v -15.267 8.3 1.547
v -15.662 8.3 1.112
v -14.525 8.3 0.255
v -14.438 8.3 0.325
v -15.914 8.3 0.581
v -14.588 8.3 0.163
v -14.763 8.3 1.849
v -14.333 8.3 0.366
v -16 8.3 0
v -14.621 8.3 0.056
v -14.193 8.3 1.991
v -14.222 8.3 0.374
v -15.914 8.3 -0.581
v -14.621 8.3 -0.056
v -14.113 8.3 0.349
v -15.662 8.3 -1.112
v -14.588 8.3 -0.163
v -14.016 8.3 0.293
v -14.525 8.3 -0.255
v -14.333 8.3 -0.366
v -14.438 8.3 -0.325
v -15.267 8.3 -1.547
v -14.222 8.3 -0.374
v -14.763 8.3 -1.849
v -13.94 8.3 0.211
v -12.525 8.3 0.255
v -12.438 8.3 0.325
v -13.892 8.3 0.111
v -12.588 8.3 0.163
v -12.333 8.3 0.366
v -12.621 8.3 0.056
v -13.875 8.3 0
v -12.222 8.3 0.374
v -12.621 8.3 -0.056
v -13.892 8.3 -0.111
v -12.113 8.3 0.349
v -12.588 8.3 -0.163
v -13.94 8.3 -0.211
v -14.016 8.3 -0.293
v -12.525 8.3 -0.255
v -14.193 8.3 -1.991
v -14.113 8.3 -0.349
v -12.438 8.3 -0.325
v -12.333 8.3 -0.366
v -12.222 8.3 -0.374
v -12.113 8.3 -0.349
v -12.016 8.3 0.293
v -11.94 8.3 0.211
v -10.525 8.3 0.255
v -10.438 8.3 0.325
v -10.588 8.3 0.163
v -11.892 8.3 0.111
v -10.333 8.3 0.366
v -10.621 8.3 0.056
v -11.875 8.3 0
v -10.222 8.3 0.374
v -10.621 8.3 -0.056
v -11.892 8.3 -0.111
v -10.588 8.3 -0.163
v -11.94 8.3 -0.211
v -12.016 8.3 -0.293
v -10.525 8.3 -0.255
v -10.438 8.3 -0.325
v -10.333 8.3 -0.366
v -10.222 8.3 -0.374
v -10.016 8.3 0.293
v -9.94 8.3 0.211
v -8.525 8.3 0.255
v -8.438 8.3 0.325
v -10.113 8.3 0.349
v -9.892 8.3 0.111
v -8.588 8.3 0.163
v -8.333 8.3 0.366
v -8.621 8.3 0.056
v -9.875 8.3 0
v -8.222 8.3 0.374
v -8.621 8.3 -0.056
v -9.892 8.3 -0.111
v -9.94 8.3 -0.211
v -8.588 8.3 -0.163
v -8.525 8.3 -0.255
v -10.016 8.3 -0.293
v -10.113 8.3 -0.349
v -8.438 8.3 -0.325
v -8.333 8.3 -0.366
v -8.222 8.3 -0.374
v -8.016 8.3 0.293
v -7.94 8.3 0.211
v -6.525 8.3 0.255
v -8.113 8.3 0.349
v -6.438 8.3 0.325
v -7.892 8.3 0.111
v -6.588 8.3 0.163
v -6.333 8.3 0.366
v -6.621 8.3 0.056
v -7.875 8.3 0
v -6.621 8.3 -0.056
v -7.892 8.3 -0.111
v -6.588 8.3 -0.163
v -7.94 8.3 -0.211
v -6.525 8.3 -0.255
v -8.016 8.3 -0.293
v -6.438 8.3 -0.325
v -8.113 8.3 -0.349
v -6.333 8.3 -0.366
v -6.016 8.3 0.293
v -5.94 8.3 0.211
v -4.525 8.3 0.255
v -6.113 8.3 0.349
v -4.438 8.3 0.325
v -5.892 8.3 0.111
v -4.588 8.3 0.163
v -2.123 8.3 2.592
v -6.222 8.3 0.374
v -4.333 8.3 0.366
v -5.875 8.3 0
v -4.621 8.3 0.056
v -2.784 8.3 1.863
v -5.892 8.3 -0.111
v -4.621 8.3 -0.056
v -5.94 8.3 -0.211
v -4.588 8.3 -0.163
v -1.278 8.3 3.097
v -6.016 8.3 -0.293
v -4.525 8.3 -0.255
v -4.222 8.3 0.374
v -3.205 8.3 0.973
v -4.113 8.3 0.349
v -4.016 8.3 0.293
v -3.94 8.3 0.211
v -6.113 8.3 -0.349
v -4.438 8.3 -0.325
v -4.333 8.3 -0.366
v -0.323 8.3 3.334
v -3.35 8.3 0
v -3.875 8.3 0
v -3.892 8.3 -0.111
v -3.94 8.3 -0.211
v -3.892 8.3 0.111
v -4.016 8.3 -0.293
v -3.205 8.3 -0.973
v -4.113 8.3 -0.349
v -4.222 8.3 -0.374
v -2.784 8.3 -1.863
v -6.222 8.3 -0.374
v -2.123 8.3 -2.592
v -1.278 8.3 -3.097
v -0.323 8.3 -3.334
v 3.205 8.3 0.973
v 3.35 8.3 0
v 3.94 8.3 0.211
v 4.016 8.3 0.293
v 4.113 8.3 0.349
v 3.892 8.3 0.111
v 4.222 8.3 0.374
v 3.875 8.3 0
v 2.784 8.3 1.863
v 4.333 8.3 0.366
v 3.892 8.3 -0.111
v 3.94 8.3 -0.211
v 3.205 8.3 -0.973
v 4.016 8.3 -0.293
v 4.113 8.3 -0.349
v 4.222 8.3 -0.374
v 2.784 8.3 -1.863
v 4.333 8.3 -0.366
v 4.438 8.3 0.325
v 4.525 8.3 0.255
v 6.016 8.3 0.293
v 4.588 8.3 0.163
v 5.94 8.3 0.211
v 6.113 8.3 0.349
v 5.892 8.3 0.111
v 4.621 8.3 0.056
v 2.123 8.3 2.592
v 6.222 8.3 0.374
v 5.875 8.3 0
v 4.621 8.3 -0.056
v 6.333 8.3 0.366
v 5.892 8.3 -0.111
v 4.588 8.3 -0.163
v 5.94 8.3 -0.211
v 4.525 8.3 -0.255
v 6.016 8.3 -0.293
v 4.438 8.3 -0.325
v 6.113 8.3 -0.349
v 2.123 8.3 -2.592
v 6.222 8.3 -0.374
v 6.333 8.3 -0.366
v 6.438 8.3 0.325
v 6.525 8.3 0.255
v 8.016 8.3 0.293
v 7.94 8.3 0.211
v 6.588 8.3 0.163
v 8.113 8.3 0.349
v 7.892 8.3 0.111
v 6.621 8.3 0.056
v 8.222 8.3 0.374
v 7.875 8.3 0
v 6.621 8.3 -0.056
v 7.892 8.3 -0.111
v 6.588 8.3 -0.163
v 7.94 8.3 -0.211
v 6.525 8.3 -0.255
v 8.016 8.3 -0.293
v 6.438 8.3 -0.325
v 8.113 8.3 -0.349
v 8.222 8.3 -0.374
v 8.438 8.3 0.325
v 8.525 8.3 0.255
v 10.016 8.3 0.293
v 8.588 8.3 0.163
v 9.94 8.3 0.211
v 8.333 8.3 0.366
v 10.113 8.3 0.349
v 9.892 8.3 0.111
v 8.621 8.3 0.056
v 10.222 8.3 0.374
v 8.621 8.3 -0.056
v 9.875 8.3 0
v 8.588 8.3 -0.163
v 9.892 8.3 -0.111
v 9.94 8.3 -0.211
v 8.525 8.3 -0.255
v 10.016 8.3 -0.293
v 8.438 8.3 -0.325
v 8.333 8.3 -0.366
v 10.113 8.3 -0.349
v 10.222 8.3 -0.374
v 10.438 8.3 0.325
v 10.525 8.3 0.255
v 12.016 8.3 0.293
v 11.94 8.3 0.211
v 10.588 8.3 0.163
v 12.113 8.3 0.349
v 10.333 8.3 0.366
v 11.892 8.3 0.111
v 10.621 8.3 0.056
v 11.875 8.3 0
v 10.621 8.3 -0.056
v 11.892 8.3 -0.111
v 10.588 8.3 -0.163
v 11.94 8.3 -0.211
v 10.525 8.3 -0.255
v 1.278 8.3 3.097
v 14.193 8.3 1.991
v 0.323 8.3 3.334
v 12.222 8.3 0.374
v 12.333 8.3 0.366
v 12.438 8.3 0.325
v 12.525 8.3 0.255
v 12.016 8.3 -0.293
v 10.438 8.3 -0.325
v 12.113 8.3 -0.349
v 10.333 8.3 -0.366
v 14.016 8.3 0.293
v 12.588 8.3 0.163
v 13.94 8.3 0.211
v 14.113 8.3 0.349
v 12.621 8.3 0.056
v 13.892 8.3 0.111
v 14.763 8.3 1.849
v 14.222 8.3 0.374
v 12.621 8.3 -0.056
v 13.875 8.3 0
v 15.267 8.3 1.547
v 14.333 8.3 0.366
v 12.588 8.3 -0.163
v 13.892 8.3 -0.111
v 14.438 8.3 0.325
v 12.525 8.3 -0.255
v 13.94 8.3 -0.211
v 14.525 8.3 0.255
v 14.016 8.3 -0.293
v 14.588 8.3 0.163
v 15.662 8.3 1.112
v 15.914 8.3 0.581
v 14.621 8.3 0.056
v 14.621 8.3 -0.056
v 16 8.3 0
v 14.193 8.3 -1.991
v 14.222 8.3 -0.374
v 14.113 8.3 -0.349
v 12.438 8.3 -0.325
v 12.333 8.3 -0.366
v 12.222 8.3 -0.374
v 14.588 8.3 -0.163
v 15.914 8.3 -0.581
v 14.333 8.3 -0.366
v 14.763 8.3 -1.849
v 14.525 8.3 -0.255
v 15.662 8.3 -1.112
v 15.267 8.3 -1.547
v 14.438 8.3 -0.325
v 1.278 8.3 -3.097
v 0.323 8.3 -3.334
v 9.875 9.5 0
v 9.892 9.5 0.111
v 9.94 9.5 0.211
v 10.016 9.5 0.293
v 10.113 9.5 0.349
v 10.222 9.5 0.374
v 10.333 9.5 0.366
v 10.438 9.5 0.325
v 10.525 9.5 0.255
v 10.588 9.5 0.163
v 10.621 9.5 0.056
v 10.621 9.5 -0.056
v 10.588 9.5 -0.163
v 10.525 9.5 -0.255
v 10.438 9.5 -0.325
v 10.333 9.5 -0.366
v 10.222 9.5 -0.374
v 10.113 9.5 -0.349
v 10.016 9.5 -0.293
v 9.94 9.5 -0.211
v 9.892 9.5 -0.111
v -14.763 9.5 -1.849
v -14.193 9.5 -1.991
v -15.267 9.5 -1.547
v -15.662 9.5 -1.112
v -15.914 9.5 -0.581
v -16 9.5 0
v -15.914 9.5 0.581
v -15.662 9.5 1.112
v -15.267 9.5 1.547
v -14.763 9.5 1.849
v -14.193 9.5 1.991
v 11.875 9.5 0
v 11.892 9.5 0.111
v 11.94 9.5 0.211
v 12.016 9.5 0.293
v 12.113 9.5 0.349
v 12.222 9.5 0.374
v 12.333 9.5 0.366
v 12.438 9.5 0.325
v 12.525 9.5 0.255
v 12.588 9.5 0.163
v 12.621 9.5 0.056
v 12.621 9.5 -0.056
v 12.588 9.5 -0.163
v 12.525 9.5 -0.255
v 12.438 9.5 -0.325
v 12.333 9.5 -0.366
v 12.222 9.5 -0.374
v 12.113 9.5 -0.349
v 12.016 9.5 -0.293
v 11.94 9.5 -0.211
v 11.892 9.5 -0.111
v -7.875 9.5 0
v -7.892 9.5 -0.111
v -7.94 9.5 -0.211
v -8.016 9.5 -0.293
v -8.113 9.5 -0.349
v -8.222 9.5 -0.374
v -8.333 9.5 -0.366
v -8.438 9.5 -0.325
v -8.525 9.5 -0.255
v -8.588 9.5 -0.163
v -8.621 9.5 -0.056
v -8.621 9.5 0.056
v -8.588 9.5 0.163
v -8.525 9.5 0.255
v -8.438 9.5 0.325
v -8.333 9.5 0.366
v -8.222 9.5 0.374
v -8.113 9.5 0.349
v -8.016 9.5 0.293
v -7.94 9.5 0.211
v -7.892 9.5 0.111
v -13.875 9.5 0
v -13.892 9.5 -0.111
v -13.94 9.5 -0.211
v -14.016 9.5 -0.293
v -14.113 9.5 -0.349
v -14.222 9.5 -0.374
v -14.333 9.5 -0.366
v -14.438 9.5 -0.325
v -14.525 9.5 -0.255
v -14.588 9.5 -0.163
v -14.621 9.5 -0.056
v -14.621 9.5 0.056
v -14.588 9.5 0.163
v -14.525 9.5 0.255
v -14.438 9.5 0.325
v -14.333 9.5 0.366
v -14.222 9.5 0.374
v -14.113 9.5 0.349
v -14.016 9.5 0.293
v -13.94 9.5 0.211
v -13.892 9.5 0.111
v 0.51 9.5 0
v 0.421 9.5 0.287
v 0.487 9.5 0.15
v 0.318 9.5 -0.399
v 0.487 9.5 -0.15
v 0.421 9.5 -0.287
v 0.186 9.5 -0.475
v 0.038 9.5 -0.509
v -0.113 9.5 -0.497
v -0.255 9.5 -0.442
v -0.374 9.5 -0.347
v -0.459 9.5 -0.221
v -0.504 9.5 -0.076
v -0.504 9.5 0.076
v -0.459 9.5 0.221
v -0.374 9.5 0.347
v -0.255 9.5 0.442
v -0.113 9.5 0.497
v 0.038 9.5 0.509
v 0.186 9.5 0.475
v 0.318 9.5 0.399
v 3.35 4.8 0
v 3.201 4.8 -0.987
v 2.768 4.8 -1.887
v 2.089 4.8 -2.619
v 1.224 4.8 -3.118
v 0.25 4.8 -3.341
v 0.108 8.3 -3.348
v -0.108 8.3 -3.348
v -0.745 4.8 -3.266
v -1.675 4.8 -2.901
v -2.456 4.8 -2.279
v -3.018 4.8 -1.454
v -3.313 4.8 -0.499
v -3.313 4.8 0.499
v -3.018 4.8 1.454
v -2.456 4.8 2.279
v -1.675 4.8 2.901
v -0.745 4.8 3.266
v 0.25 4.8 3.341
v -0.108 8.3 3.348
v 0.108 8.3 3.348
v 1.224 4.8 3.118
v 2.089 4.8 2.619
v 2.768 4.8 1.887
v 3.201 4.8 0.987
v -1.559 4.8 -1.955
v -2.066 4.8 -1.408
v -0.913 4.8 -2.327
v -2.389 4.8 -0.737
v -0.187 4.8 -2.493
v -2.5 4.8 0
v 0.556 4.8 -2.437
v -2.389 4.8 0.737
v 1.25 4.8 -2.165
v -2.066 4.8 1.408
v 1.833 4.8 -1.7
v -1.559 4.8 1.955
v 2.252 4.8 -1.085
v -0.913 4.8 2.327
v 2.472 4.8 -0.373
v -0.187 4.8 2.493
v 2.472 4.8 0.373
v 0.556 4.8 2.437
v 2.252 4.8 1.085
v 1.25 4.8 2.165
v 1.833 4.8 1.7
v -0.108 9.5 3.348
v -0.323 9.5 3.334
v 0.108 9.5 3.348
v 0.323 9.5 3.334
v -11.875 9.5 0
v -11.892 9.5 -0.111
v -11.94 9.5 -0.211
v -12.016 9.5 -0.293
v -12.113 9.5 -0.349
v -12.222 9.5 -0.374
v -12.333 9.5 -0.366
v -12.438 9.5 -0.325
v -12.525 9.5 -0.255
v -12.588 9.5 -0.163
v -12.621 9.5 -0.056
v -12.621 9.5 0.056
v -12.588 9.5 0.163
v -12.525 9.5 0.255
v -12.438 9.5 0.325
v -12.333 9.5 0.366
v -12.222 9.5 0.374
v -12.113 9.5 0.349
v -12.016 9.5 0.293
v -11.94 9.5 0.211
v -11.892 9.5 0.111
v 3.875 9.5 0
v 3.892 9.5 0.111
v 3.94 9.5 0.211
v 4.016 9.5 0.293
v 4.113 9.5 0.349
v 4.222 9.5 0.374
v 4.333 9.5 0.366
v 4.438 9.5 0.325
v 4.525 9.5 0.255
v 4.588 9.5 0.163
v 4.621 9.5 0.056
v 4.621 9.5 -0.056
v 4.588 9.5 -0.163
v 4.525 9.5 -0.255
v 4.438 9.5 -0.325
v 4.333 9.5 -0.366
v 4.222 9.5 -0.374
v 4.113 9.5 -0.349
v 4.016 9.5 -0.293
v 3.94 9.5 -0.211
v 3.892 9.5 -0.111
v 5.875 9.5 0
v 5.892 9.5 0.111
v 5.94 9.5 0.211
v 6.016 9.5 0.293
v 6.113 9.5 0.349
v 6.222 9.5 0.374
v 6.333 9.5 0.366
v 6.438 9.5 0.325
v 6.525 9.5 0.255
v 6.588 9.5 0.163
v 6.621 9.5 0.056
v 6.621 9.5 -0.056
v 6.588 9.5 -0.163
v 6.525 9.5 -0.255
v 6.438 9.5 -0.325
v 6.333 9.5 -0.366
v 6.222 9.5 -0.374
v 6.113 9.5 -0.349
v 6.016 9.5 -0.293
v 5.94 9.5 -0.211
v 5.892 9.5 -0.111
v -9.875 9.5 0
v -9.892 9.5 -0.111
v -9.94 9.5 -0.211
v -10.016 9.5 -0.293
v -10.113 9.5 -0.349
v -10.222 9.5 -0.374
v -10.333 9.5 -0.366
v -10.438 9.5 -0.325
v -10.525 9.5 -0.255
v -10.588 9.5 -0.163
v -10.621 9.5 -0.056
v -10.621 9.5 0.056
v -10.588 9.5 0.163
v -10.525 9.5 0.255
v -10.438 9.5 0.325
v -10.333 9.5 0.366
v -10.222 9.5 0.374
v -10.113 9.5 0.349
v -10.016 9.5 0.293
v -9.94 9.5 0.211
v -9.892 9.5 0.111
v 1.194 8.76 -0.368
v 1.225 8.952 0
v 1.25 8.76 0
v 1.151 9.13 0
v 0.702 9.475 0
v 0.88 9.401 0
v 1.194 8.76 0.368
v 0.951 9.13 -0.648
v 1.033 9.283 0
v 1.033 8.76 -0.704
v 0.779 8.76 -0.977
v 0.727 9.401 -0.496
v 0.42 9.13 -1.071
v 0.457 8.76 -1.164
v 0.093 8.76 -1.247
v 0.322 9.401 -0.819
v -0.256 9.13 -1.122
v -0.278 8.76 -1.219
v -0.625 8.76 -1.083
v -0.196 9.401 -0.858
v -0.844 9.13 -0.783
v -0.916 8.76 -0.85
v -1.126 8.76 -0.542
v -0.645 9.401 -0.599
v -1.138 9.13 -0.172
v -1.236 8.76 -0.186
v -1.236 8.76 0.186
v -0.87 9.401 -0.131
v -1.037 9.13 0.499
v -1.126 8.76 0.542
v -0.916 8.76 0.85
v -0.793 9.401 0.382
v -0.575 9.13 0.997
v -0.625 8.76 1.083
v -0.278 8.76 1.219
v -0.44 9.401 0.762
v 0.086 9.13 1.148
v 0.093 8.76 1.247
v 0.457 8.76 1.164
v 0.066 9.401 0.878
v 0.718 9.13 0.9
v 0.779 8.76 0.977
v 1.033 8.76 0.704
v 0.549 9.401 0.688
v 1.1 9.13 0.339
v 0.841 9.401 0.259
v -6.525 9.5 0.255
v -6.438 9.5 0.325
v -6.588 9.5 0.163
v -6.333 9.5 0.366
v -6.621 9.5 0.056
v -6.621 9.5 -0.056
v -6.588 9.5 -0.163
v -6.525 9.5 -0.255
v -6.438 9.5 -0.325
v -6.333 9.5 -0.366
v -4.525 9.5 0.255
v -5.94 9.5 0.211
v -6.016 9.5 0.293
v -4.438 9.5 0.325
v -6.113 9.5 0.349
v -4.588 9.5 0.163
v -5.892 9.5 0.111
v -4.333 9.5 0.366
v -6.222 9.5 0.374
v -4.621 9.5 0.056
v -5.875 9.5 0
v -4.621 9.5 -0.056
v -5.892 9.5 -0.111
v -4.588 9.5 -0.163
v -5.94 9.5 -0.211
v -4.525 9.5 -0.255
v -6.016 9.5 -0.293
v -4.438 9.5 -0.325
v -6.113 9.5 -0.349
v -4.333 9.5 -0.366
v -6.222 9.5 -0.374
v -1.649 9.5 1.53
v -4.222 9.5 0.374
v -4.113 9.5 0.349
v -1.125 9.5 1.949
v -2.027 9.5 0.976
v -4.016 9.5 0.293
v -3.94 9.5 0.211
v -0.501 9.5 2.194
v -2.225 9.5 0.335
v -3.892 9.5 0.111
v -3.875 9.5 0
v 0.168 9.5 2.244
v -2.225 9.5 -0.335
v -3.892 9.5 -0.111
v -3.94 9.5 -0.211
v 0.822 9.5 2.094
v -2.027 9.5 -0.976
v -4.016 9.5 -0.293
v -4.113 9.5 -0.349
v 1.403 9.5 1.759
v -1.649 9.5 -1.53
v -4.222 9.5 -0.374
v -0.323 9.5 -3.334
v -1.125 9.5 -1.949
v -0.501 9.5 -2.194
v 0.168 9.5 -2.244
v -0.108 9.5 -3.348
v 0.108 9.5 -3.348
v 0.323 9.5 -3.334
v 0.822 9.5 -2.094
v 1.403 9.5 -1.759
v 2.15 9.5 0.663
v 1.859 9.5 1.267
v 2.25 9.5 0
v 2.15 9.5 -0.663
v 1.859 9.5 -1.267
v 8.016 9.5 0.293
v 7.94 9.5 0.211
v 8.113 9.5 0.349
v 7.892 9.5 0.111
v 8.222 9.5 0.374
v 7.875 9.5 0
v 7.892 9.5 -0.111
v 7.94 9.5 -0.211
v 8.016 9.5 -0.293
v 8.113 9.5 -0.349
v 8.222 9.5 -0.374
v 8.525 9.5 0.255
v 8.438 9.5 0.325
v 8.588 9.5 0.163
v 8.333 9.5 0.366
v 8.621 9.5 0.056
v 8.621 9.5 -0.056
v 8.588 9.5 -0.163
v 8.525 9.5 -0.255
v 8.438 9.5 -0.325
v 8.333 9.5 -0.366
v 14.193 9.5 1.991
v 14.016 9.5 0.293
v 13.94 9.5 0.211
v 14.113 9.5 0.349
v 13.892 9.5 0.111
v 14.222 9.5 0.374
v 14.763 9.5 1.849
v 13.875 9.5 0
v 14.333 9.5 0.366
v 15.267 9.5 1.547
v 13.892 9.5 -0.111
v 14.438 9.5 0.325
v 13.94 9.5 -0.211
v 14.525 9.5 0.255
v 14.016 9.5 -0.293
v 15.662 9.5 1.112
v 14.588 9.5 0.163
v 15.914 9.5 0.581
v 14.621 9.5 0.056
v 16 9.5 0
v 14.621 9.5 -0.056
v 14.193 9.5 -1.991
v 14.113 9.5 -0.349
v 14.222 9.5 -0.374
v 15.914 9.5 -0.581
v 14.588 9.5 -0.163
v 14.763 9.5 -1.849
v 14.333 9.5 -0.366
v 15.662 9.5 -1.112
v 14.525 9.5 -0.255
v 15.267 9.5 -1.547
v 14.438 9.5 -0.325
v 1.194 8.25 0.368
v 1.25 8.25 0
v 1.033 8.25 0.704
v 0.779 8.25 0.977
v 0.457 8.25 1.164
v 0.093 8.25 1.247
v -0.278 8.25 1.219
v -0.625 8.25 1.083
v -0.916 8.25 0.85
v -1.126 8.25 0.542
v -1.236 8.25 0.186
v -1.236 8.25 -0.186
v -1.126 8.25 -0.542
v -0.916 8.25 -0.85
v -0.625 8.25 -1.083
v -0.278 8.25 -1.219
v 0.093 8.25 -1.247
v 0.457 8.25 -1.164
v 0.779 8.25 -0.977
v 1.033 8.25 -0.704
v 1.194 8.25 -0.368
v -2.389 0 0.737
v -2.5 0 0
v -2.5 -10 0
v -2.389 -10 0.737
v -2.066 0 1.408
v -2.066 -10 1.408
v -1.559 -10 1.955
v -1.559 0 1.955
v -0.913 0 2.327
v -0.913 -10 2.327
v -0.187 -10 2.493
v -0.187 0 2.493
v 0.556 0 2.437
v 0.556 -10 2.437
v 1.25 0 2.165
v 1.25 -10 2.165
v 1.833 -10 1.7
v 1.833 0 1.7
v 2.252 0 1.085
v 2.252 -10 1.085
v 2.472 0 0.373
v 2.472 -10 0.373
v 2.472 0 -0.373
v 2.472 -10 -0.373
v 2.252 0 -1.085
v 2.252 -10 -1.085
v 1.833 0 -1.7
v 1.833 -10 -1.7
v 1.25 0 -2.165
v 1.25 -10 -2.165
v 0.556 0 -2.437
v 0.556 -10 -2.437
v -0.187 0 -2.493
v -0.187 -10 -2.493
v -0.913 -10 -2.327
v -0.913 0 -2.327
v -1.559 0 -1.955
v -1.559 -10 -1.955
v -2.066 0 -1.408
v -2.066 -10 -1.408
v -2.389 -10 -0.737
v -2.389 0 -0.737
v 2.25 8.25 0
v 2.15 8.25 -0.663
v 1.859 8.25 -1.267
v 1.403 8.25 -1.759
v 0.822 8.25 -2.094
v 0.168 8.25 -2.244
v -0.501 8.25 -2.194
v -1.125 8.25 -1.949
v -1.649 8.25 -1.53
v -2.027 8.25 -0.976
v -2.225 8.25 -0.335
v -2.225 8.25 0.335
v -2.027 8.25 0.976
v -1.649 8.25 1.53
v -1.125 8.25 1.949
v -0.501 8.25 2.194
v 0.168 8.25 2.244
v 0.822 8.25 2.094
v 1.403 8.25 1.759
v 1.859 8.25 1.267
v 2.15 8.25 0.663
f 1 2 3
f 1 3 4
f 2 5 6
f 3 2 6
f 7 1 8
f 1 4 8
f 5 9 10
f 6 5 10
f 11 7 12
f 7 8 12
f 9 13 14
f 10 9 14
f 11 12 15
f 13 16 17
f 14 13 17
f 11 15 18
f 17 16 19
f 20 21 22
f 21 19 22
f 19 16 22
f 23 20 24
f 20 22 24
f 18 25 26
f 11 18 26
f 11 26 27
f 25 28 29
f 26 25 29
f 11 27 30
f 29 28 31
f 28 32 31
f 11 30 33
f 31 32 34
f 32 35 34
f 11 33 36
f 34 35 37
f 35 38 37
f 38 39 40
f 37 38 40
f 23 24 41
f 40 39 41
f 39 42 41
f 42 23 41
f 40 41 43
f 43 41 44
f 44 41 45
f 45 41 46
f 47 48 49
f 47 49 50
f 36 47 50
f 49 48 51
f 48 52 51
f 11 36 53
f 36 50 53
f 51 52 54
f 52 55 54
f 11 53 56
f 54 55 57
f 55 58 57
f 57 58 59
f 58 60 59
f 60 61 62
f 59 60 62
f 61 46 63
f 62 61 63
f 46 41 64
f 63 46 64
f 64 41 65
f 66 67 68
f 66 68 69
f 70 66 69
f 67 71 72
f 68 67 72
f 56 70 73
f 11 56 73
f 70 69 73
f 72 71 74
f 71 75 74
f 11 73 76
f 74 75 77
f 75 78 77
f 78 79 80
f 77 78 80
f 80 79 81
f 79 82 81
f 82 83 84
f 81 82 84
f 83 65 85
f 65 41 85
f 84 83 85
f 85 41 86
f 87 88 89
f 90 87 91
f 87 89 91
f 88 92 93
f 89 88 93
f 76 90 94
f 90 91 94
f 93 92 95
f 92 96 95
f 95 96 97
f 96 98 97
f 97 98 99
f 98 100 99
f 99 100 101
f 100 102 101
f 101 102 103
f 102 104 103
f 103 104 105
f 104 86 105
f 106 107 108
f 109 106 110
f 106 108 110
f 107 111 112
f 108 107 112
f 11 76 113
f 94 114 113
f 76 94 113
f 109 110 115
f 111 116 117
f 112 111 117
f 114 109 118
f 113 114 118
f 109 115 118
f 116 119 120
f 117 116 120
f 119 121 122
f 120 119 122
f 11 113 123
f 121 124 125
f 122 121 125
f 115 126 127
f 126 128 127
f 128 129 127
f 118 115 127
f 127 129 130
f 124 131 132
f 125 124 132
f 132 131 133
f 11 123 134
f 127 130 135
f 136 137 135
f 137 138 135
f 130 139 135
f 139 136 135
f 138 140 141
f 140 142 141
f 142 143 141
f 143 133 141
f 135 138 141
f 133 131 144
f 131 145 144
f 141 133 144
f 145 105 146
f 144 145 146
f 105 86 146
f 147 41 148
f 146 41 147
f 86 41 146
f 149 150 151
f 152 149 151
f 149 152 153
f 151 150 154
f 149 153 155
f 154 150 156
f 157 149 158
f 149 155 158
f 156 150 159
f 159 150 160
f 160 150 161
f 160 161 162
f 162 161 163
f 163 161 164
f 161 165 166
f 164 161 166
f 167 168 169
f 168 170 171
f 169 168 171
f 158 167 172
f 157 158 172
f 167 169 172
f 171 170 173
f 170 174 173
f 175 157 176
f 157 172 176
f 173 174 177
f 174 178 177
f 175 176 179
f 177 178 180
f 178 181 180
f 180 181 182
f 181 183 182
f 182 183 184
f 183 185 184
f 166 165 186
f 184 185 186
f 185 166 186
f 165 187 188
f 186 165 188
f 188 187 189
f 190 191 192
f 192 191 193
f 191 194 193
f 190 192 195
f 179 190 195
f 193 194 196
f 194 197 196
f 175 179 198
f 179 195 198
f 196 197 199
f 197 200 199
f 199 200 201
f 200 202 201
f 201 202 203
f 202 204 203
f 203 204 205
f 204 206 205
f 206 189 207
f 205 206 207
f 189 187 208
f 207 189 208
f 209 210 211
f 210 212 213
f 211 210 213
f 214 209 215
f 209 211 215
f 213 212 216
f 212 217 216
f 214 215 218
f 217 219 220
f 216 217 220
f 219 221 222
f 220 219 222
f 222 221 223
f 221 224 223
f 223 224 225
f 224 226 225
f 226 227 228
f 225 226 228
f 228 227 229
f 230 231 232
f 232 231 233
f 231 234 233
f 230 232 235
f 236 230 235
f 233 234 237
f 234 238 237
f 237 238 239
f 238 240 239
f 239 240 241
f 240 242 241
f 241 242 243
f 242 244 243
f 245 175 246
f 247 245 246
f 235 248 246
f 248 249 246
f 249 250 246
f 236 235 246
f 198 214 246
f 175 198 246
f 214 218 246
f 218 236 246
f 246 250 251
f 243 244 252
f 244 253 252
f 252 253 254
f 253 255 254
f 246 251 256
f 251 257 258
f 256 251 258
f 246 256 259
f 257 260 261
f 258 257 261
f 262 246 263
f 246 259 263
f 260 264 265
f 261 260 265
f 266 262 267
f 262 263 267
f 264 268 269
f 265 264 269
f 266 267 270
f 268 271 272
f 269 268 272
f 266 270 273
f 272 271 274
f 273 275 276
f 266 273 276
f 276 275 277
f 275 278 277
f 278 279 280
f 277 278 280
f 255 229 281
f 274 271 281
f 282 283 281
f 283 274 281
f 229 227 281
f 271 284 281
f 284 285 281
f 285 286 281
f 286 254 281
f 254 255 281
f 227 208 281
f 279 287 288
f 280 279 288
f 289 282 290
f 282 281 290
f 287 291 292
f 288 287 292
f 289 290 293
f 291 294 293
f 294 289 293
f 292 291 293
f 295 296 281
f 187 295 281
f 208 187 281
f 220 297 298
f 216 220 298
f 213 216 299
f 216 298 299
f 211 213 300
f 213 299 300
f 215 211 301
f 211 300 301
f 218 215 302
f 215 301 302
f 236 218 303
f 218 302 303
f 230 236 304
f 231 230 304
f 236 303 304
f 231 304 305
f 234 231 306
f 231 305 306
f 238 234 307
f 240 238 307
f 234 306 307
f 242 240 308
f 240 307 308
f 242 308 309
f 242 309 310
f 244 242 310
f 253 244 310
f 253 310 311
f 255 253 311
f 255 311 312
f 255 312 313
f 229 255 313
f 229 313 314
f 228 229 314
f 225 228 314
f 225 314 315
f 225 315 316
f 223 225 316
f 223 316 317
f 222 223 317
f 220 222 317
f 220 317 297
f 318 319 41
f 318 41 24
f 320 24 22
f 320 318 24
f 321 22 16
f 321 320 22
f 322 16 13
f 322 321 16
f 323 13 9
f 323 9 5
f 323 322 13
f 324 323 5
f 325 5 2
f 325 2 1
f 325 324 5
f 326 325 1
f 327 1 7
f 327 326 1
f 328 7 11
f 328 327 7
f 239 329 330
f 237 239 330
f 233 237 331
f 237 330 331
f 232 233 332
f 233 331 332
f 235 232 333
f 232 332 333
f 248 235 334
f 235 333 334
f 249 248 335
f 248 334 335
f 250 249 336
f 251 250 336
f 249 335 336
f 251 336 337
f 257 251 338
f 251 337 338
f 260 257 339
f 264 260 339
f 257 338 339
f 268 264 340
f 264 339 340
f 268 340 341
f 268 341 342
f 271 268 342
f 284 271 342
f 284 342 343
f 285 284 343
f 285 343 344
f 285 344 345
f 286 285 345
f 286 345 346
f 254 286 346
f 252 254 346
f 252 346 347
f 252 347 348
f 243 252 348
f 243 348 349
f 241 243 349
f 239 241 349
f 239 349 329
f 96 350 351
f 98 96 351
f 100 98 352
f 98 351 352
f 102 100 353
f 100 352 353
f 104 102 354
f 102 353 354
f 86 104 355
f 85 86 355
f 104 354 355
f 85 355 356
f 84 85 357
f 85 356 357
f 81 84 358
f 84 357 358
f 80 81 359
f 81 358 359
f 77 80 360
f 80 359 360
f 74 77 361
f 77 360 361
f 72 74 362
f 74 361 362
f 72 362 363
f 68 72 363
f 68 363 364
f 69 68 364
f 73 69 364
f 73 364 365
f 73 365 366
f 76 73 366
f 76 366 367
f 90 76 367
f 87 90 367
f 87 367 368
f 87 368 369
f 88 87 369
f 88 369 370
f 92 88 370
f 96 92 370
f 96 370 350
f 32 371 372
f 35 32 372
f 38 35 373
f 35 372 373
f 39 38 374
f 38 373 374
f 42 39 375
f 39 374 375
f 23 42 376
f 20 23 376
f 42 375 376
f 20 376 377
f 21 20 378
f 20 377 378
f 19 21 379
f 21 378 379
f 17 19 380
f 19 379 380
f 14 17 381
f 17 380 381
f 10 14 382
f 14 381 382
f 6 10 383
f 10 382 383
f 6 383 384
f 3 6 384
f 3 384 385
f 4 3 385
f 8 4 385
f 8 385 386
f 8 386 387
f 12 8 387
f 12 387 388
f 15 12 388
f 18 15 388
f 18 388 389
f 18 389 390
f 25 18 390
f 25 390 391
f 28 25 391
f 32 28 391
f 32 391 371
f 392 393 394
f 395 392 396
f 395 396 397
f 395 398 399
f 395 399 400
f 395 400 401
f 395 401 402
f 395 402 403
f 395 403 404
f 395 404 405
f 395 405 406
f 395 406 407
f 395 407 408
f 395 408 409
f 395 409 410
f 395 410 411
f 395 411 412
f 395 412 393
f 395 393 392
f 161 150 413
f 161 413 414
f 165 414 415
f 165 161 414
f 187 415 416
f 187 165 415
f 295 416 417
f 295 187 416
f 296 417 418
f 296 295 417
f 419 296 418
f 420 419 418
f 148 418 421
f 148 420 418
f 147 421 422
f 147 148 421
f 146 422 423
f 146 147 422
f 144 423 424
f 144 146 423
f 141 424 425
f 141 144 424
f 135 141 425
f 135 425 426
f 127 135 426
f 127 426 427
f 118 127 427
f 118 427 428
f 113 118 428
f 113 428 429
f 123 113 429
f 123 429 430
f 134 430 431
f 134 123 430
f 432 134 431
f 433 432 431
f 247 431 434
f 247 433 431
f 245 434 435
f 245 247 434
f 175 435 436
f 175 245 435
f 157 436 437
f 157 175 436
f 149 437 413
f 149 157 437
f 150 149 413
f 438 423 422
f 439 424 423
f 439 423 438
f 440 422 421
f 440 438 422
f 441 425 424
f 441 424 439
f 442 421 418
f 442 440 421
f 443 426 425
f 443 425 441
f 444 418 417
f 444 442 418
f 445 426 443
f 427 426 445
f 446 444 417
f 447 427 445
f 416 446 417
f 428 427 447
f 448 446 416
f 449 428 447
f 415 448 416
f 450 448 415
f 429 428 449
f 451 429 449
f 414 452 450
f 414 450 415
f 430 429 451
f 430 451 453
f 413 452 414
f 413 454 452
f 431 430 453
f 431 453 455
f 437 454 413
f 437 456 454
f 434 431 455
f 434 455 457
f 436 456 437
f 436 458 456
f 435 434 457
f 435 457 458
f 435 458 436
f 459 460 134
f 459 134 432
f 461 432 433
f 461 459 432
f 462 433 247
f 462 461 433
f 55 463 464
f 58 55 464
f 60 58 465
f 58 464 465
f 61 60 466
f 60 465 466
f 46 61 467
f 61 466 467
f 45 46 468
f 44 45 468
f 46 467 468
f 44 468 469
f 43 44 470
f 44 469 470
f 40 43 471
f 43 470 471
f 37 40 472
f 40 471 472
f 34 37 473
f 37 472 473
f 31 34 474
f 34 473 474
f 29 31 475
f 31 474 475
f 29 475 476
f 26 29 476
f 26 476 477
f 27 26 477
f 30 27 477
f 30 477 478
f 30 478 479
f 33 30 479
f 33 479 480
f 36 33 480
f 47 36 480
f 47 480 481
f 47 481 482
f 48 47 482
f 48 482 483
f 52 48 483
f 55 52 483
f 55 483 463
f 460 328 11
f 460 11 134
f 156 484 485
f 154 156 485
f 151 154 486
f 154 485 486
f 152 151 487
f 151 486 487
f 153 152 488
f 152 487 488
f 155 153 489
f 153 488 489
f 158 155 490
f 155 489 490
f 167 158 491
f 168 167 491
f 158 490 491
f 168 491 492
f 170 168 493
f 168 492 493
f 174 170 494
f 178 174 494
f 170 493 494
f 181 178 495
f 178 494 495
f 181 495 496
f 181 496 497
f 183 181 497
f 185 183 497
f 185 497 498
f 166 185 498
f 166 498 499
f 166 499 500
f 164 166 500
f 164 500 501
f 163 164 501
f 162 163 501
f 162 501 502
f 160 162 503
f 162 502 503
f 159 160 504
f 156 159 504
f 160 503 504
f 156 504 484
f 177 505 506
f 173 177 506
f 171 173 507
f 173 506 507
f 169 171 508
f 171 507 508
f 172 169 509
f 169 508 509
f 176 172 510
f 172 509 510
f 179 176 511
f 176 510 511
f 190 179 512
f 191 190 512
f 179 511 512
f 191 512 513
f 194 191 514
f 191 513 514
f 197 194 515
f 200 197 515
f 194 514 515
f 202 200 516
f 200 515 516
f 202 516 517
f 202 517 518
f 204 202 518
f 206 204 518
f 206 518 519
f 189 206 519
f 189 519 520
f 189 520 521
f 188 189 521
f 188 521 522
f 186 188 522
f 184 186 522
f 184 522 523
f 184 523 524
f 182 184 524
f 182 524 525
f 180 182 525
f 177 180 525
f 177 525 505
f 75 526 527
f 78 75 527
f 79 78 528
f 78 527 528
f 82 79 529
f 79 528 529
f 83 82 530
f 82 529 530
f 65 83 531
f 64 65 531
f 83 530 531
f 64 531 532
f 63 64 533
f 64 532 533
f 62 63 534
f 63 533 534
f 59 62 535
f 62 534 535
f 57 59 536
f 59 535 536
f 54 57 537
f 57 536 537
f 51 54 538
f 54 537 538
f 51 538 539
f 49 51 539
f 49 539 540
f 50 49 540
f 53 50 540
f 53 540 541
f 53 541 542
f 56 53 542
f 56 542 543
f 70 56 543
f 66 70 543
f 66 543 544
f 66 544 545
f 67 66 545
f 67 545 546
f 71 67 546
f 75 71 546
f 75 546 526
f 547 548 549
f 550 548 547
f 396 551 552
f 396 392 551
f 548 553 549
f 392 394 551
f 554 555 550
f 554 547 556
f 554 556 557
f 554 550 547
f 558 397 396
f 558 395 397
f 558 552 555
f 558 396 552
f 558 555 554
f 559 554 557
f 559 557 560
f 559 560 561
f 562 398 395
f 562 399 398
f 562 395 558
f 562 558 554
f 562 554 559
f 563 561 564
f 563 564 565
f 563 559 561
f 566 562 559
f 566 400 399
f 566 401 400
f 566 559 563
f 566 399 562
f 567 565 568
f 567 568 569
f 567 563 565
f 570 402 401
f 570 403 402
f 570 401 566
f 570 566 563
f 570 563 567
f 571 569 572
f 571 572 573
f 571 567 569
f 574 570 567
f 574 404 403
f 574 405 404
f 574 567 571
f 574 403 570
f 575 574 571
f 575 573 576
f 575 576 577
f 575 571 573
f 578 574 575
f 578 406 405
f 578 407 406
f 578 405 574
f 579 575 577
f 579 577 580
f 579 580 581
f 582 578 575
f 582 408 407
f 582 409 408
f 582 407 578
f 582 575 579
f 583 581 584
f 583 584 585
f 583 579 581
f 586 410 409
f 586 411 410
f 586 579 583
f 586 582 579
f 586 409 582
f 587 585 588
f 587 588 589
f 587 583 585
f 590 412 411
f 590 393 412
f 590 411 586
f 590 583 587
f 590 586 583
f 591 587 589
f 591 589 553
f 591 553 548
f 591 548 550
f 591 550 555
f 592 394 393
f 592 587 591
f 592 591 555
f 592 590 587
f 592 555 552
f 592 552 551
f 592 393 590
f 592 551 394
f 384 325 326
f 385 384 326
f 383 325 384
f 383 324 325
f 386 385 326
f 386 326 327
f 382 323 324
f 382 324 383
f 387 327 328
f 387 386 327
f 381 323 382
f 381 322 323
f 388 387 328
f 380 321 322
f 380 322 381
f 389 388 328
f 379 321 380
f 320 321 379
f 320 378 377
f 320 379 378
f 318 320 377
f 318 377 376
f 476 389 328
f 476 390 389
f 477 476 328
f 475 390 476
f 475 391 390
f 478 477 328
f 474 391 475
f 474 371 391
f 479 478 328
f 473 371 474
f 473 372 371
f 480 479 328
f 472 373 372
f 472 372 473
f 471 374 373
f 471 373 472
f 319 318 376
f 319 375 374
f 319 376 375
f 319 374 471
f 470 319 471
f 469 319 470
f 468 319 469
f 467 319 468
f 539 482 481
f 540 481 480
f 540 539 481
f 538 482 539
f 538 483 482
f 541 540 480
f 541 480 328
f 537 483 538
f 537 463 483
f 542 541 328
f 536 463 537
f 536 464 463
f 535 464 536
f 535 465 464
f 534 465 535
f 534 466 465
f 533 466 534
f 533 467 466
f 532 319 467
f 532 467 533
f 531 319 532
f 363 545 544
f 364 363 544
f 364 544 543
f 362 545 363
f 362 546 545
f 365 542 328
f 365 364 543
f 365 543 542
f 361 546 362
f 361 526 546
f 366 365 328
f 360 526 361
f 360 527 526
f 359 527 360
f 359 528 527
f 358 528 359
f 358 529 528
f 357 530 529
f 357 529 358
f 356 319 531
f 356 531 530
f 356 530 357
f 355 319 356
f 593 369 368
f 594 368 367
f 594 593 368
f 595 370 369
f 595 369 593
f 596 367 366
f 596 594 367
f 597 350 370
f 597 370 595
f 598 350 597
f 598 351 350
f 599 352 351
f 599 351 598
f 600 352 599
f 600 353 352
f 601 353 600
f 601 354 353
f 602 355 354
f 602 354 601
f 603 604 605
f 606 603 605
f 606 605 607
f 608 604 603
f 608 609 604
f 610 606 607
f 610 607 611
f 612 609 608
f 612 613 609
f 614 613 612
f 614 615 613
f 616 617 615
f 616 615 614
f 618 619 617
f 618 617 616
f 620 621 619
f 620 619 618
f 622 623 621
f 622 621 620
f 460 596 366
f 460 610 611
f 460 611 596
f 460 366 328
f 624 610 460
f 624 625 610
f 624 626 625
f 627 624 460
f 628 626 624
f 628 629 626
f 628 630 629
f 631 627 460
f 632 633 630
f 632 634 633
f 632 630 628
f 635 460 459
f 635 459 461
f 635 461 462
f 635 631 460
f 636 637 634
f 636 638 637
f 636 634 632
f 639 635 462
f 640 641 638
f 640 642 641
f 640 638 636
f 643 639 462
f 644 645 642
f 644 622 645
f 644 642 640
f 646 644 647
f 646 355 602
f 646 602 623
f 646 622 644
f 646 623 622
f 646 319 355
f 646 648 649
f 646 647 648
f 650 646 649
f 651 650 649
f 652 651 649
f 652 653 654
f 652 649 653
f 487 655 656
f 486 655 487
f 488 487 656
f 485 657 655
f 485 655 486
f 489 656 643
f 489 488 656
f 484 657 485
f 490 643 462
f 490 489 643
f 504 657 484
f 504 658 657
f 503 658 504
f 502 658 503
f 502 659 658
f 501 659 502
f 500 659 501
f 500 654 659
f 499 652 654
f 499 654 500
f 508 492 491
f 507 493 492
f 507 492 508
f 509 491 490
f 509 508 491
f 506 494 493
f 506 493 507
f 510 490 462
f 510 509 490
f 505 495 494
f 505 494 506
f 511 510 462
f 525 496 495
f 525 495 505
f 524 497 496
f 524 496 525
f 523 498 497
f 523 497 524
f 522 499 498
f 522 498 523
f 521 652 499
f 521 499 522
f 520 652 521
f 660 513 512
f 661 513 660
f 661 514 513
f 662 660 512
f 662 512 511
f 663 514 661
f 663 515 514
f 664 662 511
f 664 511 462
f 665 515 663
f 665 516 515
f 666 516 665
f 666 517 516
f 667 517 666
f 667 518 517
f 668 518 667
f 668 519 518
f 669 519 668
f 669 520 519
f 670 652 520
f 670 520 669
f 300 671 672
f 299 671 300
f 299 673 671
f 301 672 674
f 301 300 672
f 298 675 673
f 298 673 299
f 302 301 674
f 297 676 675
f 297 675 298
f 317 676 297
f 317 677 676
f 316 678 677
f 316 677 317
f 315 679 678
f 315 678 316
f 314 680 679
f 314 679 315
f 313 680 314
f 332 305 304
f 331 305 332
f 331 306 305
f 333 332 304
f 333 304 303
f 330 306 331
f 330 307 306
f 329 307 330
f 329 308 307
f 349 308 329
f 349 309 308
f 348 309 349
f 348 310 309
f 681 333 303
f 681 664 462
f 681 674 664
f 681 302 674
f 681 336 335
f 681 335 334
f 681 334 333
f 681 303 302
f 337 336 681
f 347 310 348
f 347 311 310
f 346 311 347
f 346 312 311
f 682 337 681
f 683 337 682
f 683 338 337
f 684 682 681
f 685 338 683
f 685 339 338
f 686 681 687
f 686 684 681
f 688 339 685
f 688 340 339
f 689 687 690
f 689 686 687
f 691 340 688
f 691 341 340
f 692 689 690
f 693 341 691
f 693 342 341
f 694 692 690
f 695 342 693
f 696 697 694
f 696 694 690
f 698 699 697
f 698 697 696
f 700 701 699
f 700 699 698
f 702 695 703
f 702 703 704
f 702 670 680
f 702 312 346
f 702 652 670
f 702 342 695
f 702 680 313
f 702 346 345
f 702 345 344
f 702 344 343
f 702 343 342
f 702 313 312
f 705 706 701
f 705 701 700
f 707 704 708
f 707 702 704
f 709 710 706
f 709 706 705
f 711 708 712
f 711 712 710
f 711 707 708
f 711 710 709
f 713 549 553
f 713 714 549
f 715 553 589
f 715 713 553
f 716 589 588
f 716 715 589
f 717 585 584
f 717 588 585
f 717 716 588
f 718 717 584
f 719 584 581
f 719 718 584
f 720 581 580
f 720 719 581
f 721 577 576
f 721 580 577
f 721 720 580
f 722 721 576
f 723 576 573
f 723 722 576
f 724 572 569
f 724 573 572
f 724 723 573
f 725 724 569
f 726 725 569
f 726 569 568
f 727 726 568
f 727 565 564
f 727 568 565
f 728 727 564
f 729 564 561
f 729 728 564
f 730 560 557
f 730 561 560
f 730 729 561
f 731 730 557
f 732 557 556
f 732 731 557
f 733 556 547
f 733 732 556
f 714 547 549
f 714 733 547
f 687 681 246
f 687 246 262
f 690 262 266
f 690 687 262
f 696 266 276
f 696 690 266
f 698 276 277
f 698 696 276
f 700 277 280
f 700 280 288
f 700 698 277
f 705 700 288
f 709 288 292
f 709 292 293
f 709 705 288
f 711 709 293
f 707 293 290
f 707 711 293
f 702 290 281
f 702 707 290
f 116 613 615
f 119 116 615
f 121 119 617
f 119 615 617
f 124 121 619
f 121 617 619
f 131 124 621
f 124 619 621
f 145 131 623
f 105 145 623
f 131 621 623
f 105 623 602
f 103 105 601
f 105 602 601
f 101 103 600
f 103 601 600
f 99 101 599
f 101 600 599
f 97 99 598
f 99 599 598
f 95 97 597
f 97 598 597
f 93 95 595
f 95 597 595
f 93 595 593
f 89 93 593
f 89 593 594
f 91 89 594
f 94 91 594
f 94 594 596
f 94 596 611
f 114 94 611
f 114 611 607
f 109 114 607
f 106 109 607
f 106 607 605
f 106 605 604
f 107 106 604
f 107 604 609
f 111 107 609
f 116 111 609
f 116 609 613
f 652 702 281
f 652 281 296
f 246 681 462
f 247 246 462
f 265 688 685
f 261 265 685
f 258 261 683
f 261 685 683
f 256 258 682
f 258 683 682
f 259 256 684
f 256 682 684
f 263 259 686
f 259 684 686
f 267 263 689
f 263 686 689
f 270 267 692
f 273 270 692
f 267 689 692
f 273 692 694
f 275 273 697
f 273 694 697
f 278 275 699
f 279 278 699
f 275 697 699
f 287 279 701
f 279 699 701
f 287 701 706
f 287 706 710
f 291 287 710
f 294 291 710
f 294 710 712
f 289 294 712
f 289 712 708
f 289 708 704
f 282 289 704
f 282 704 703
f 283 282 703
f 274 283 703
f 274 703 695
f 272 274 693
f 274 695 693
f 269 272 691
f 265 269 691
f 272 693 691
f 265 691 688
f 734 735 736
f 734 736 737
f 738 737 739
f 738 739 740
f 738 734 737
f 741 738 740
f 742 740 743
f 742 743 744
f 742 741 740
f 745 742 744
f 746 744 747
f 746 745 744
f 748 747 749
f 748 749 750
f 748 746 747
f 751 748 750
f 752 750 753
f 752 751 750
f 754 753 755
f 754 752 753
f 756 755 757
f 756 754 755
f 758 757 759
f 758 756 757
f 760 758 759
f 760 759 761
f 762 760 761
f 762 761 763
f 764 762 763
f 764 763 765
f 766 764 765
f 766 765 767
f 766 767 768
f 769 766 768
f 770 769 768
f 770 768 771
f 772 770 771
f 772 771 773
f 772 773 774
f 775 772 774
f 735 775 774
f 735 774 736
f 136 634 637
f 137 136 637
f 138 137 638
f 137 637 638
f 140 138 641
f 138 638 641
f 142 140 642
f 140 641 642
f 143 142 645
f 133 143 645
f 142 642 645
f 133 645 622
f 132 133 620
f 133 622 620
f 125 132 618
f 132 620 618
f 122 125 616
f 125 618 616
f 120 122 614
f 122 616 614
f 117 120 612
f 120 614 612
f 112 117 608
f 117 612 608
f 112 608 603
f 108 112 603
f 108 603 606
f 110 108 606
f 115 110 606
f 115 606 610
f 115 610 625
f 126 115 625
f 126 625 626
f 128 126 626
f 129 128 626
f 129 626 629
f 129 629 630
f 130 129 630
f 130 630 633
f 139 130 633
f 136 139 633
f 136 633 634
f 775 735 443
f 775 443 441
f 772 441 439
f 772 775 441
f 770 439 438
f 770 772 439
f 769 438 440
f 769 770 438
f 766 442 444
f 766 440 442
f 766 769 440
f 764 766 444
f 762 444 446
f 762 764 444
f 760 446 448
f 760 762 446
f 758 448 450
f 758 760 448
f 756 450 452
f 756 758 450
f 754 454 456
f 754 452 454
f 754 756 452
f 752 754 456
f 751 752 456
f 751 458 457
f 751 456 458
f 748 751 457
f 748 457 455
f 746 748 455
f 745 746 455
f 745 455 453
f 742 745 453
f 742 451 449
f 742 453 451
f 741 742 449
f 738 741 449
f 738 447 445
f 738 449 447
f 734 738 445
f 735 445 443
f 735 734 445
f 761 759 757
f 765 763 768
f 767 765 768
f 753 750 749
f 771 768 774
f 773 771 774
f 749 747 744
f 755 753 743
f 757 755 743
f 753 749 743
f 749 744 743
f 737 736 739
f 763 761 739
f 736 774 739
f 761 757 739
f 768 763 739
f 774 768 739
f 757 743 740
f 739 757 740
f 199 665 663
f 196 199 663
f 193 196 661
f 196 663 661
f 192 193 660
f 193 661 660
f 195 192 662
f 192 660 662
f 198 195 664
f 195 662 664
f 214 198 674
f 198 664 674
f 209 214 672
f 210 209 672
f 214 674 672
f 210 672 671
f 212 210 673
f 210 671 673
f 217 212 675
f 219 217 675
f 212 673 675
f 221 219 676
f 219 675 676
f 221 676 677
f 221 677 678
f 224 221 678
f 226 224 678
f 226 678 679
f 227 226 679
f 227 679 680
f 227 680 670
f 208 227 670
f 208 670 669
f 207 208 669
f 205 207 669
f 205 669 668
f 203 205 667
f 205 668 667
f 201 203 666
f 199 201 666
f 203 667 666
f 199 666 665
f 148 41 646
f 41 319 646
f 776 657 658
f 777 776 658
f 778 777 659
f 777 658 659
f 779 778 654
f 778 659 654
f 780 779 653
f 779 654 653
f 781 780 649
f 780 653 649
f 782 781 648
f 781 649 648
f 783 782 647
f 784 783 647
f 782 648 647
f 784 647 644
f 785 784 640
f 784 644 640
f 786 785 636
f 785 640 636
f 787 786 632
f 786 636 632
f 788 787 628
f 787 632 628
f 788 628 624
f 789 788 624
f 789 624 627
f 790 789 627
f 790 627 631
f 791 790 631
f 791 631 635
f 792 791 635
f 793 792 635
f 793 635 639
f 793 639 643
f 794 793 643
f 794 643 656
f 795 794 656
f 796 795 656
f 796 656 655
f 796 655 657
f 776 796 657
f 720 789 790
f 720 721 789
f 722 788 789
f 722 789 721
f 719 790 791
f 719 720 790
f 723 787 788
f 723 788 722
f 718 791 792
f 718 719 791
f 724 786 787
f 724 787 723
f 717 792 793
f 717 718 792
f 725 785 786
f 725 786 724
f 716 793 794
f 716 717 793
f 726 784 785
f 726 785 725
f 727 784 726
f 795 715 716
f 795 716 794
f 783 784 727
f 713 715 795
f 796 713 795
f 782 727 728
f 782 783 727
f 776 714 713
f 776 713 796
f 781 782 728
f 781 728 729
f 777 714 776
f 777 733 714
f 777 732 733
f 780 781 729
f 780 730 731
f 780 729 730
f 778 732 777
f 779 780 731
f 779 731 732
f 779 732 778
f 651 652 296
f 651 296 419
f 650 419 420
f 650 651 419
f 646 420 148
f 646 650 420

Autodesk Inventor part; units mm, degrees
ref_plane "YZ Plane" through (0, 0, 0) normal (1, 0, 0) x (0, 1, 0)
ref_plane "XZ Plane" through (0, 0, 0) normal (0, 1, 0) x (-1, 0, 0)
ref_plane "XY Plane" through (0, 0, 0) normal (0, 0, 1) x (1, 0, 0)
sketch "Sketch1" plane through (0, 0, 0) normal (0, 1, 0) x (-1, 0, 0)
  circle A0 centre (0, 0) radius 2.5
  dimension "d0" = 5
extrude "Extrusion1" add sketch "Sketch1" along normal blind 9.5 and the other way blind 10
sketch "Sketch2" plane through (0, 9.5, 0) normal (0, 1, 0) x (1, 0, 0)
  line L0 (0, 0) -> (-16, 0) construction
  line L1 (0, 0) -> (0, 3.35) construction
  arc A0 (-14.1929, 1.9907) -> (-14.1929, -1.9907) centre (-14, 0) ccw
  line L2 (-14.1929, -1.9907) -> (-0.323, -3.3344)
  line L3 (-14.1929, 1.9907) -> (-0.323, 3.3344)
  arc A1 (14.1929, -1.9907) -> (14.1929, 1.9907) centre (14, 0) ccw
  line L4 (14.1929, -1.9907) -> (0.323, -3.3344)
  line L5 (14.1929, 1.9907) -> (0.323, 3.3344)
  circle A2 centre (0, 0) radius 2.5
  arc A3 (-0.323, -3.3344) -> (0.323, -3.3344) centre (0, 0) ccw
  arc A4 (0.323, 3.3344) -> (-0.323, 3.3344) centre (0, 0) ccw
  dimension "d5" = 16
  dimension "d7" = 4
  dimension "d8" = 2
  dimension "d11" = 0.85
extrude "Extrusion2" add sketch "Sketch2" against normal blind 1.2
sketch "Sketch3" plane through (0, 8.3, 0) normal (0, -1, 0) x (1, 0, 0)
  circle A0 centre (0, 0) radius 2.5 projected
  circle A1 centre (0, 0) radius 3.35
extrude "Extrusion3" add sketch "Sketch3" along normal blind 3.5
sketch "Sketch4" plane through (0, 9.5, 0) normal (0, 1, 0) x (1, 0, 0)
  circle A0 centre (0, 0) radius 2.25
  dimension "d16" = 4.5
extrude "Extrusion4" cut sketch "Sketch4" against normal blind 1.25
sketch "Sketch5" plane through (0, 8.25, 0) normal (0, 1, 0) x (1, 0, 0)
  circle A0 centre (0, 0) radius 1.25
  dimension "d19" = 2.5
extrude "Extrusion5" add sketch "Sketch5" along normal blind 1.25
fillet "Fillet1" radius 0.74 1 edges at (-1.25, 9.5, 0)
sketch "Sketch6" plane through (0, 9.5, 0) normal (0, 1, 0) x (1, 0, 0)
  circle A0 centre (-4.25, 0) radius 0.375
  line L0 (0, 0) -> (-16, 0) construction
  arc A1 (-14.1929, 1.9907) -> (-14.1929, -1.9907) centre (-14, 0) ccw construction
  circle A2 centre (-6.25, 0) radius 0.375
  circle A3 centre (-8.25, 0) radius 0.375
  circle A4 centre (-10.25, 0) radius 0.375
  circle A5 centre (-12.25, 0) radius 0.375
  circle A6 centre (-14.25, 0) radius 0.375
  dimension "d23" = 0.75
  dimension "d24" = 4.25
  dimension "d27" = 2
extrude "Extrusion6" cut sketch "Sketch6" against normal blind 2.8375
mirror "Mirror1" about plane through (0, 0, 0) normal (1, 0, 0) of "Extrusion6"
properties part number "Servo shaft and horn"
